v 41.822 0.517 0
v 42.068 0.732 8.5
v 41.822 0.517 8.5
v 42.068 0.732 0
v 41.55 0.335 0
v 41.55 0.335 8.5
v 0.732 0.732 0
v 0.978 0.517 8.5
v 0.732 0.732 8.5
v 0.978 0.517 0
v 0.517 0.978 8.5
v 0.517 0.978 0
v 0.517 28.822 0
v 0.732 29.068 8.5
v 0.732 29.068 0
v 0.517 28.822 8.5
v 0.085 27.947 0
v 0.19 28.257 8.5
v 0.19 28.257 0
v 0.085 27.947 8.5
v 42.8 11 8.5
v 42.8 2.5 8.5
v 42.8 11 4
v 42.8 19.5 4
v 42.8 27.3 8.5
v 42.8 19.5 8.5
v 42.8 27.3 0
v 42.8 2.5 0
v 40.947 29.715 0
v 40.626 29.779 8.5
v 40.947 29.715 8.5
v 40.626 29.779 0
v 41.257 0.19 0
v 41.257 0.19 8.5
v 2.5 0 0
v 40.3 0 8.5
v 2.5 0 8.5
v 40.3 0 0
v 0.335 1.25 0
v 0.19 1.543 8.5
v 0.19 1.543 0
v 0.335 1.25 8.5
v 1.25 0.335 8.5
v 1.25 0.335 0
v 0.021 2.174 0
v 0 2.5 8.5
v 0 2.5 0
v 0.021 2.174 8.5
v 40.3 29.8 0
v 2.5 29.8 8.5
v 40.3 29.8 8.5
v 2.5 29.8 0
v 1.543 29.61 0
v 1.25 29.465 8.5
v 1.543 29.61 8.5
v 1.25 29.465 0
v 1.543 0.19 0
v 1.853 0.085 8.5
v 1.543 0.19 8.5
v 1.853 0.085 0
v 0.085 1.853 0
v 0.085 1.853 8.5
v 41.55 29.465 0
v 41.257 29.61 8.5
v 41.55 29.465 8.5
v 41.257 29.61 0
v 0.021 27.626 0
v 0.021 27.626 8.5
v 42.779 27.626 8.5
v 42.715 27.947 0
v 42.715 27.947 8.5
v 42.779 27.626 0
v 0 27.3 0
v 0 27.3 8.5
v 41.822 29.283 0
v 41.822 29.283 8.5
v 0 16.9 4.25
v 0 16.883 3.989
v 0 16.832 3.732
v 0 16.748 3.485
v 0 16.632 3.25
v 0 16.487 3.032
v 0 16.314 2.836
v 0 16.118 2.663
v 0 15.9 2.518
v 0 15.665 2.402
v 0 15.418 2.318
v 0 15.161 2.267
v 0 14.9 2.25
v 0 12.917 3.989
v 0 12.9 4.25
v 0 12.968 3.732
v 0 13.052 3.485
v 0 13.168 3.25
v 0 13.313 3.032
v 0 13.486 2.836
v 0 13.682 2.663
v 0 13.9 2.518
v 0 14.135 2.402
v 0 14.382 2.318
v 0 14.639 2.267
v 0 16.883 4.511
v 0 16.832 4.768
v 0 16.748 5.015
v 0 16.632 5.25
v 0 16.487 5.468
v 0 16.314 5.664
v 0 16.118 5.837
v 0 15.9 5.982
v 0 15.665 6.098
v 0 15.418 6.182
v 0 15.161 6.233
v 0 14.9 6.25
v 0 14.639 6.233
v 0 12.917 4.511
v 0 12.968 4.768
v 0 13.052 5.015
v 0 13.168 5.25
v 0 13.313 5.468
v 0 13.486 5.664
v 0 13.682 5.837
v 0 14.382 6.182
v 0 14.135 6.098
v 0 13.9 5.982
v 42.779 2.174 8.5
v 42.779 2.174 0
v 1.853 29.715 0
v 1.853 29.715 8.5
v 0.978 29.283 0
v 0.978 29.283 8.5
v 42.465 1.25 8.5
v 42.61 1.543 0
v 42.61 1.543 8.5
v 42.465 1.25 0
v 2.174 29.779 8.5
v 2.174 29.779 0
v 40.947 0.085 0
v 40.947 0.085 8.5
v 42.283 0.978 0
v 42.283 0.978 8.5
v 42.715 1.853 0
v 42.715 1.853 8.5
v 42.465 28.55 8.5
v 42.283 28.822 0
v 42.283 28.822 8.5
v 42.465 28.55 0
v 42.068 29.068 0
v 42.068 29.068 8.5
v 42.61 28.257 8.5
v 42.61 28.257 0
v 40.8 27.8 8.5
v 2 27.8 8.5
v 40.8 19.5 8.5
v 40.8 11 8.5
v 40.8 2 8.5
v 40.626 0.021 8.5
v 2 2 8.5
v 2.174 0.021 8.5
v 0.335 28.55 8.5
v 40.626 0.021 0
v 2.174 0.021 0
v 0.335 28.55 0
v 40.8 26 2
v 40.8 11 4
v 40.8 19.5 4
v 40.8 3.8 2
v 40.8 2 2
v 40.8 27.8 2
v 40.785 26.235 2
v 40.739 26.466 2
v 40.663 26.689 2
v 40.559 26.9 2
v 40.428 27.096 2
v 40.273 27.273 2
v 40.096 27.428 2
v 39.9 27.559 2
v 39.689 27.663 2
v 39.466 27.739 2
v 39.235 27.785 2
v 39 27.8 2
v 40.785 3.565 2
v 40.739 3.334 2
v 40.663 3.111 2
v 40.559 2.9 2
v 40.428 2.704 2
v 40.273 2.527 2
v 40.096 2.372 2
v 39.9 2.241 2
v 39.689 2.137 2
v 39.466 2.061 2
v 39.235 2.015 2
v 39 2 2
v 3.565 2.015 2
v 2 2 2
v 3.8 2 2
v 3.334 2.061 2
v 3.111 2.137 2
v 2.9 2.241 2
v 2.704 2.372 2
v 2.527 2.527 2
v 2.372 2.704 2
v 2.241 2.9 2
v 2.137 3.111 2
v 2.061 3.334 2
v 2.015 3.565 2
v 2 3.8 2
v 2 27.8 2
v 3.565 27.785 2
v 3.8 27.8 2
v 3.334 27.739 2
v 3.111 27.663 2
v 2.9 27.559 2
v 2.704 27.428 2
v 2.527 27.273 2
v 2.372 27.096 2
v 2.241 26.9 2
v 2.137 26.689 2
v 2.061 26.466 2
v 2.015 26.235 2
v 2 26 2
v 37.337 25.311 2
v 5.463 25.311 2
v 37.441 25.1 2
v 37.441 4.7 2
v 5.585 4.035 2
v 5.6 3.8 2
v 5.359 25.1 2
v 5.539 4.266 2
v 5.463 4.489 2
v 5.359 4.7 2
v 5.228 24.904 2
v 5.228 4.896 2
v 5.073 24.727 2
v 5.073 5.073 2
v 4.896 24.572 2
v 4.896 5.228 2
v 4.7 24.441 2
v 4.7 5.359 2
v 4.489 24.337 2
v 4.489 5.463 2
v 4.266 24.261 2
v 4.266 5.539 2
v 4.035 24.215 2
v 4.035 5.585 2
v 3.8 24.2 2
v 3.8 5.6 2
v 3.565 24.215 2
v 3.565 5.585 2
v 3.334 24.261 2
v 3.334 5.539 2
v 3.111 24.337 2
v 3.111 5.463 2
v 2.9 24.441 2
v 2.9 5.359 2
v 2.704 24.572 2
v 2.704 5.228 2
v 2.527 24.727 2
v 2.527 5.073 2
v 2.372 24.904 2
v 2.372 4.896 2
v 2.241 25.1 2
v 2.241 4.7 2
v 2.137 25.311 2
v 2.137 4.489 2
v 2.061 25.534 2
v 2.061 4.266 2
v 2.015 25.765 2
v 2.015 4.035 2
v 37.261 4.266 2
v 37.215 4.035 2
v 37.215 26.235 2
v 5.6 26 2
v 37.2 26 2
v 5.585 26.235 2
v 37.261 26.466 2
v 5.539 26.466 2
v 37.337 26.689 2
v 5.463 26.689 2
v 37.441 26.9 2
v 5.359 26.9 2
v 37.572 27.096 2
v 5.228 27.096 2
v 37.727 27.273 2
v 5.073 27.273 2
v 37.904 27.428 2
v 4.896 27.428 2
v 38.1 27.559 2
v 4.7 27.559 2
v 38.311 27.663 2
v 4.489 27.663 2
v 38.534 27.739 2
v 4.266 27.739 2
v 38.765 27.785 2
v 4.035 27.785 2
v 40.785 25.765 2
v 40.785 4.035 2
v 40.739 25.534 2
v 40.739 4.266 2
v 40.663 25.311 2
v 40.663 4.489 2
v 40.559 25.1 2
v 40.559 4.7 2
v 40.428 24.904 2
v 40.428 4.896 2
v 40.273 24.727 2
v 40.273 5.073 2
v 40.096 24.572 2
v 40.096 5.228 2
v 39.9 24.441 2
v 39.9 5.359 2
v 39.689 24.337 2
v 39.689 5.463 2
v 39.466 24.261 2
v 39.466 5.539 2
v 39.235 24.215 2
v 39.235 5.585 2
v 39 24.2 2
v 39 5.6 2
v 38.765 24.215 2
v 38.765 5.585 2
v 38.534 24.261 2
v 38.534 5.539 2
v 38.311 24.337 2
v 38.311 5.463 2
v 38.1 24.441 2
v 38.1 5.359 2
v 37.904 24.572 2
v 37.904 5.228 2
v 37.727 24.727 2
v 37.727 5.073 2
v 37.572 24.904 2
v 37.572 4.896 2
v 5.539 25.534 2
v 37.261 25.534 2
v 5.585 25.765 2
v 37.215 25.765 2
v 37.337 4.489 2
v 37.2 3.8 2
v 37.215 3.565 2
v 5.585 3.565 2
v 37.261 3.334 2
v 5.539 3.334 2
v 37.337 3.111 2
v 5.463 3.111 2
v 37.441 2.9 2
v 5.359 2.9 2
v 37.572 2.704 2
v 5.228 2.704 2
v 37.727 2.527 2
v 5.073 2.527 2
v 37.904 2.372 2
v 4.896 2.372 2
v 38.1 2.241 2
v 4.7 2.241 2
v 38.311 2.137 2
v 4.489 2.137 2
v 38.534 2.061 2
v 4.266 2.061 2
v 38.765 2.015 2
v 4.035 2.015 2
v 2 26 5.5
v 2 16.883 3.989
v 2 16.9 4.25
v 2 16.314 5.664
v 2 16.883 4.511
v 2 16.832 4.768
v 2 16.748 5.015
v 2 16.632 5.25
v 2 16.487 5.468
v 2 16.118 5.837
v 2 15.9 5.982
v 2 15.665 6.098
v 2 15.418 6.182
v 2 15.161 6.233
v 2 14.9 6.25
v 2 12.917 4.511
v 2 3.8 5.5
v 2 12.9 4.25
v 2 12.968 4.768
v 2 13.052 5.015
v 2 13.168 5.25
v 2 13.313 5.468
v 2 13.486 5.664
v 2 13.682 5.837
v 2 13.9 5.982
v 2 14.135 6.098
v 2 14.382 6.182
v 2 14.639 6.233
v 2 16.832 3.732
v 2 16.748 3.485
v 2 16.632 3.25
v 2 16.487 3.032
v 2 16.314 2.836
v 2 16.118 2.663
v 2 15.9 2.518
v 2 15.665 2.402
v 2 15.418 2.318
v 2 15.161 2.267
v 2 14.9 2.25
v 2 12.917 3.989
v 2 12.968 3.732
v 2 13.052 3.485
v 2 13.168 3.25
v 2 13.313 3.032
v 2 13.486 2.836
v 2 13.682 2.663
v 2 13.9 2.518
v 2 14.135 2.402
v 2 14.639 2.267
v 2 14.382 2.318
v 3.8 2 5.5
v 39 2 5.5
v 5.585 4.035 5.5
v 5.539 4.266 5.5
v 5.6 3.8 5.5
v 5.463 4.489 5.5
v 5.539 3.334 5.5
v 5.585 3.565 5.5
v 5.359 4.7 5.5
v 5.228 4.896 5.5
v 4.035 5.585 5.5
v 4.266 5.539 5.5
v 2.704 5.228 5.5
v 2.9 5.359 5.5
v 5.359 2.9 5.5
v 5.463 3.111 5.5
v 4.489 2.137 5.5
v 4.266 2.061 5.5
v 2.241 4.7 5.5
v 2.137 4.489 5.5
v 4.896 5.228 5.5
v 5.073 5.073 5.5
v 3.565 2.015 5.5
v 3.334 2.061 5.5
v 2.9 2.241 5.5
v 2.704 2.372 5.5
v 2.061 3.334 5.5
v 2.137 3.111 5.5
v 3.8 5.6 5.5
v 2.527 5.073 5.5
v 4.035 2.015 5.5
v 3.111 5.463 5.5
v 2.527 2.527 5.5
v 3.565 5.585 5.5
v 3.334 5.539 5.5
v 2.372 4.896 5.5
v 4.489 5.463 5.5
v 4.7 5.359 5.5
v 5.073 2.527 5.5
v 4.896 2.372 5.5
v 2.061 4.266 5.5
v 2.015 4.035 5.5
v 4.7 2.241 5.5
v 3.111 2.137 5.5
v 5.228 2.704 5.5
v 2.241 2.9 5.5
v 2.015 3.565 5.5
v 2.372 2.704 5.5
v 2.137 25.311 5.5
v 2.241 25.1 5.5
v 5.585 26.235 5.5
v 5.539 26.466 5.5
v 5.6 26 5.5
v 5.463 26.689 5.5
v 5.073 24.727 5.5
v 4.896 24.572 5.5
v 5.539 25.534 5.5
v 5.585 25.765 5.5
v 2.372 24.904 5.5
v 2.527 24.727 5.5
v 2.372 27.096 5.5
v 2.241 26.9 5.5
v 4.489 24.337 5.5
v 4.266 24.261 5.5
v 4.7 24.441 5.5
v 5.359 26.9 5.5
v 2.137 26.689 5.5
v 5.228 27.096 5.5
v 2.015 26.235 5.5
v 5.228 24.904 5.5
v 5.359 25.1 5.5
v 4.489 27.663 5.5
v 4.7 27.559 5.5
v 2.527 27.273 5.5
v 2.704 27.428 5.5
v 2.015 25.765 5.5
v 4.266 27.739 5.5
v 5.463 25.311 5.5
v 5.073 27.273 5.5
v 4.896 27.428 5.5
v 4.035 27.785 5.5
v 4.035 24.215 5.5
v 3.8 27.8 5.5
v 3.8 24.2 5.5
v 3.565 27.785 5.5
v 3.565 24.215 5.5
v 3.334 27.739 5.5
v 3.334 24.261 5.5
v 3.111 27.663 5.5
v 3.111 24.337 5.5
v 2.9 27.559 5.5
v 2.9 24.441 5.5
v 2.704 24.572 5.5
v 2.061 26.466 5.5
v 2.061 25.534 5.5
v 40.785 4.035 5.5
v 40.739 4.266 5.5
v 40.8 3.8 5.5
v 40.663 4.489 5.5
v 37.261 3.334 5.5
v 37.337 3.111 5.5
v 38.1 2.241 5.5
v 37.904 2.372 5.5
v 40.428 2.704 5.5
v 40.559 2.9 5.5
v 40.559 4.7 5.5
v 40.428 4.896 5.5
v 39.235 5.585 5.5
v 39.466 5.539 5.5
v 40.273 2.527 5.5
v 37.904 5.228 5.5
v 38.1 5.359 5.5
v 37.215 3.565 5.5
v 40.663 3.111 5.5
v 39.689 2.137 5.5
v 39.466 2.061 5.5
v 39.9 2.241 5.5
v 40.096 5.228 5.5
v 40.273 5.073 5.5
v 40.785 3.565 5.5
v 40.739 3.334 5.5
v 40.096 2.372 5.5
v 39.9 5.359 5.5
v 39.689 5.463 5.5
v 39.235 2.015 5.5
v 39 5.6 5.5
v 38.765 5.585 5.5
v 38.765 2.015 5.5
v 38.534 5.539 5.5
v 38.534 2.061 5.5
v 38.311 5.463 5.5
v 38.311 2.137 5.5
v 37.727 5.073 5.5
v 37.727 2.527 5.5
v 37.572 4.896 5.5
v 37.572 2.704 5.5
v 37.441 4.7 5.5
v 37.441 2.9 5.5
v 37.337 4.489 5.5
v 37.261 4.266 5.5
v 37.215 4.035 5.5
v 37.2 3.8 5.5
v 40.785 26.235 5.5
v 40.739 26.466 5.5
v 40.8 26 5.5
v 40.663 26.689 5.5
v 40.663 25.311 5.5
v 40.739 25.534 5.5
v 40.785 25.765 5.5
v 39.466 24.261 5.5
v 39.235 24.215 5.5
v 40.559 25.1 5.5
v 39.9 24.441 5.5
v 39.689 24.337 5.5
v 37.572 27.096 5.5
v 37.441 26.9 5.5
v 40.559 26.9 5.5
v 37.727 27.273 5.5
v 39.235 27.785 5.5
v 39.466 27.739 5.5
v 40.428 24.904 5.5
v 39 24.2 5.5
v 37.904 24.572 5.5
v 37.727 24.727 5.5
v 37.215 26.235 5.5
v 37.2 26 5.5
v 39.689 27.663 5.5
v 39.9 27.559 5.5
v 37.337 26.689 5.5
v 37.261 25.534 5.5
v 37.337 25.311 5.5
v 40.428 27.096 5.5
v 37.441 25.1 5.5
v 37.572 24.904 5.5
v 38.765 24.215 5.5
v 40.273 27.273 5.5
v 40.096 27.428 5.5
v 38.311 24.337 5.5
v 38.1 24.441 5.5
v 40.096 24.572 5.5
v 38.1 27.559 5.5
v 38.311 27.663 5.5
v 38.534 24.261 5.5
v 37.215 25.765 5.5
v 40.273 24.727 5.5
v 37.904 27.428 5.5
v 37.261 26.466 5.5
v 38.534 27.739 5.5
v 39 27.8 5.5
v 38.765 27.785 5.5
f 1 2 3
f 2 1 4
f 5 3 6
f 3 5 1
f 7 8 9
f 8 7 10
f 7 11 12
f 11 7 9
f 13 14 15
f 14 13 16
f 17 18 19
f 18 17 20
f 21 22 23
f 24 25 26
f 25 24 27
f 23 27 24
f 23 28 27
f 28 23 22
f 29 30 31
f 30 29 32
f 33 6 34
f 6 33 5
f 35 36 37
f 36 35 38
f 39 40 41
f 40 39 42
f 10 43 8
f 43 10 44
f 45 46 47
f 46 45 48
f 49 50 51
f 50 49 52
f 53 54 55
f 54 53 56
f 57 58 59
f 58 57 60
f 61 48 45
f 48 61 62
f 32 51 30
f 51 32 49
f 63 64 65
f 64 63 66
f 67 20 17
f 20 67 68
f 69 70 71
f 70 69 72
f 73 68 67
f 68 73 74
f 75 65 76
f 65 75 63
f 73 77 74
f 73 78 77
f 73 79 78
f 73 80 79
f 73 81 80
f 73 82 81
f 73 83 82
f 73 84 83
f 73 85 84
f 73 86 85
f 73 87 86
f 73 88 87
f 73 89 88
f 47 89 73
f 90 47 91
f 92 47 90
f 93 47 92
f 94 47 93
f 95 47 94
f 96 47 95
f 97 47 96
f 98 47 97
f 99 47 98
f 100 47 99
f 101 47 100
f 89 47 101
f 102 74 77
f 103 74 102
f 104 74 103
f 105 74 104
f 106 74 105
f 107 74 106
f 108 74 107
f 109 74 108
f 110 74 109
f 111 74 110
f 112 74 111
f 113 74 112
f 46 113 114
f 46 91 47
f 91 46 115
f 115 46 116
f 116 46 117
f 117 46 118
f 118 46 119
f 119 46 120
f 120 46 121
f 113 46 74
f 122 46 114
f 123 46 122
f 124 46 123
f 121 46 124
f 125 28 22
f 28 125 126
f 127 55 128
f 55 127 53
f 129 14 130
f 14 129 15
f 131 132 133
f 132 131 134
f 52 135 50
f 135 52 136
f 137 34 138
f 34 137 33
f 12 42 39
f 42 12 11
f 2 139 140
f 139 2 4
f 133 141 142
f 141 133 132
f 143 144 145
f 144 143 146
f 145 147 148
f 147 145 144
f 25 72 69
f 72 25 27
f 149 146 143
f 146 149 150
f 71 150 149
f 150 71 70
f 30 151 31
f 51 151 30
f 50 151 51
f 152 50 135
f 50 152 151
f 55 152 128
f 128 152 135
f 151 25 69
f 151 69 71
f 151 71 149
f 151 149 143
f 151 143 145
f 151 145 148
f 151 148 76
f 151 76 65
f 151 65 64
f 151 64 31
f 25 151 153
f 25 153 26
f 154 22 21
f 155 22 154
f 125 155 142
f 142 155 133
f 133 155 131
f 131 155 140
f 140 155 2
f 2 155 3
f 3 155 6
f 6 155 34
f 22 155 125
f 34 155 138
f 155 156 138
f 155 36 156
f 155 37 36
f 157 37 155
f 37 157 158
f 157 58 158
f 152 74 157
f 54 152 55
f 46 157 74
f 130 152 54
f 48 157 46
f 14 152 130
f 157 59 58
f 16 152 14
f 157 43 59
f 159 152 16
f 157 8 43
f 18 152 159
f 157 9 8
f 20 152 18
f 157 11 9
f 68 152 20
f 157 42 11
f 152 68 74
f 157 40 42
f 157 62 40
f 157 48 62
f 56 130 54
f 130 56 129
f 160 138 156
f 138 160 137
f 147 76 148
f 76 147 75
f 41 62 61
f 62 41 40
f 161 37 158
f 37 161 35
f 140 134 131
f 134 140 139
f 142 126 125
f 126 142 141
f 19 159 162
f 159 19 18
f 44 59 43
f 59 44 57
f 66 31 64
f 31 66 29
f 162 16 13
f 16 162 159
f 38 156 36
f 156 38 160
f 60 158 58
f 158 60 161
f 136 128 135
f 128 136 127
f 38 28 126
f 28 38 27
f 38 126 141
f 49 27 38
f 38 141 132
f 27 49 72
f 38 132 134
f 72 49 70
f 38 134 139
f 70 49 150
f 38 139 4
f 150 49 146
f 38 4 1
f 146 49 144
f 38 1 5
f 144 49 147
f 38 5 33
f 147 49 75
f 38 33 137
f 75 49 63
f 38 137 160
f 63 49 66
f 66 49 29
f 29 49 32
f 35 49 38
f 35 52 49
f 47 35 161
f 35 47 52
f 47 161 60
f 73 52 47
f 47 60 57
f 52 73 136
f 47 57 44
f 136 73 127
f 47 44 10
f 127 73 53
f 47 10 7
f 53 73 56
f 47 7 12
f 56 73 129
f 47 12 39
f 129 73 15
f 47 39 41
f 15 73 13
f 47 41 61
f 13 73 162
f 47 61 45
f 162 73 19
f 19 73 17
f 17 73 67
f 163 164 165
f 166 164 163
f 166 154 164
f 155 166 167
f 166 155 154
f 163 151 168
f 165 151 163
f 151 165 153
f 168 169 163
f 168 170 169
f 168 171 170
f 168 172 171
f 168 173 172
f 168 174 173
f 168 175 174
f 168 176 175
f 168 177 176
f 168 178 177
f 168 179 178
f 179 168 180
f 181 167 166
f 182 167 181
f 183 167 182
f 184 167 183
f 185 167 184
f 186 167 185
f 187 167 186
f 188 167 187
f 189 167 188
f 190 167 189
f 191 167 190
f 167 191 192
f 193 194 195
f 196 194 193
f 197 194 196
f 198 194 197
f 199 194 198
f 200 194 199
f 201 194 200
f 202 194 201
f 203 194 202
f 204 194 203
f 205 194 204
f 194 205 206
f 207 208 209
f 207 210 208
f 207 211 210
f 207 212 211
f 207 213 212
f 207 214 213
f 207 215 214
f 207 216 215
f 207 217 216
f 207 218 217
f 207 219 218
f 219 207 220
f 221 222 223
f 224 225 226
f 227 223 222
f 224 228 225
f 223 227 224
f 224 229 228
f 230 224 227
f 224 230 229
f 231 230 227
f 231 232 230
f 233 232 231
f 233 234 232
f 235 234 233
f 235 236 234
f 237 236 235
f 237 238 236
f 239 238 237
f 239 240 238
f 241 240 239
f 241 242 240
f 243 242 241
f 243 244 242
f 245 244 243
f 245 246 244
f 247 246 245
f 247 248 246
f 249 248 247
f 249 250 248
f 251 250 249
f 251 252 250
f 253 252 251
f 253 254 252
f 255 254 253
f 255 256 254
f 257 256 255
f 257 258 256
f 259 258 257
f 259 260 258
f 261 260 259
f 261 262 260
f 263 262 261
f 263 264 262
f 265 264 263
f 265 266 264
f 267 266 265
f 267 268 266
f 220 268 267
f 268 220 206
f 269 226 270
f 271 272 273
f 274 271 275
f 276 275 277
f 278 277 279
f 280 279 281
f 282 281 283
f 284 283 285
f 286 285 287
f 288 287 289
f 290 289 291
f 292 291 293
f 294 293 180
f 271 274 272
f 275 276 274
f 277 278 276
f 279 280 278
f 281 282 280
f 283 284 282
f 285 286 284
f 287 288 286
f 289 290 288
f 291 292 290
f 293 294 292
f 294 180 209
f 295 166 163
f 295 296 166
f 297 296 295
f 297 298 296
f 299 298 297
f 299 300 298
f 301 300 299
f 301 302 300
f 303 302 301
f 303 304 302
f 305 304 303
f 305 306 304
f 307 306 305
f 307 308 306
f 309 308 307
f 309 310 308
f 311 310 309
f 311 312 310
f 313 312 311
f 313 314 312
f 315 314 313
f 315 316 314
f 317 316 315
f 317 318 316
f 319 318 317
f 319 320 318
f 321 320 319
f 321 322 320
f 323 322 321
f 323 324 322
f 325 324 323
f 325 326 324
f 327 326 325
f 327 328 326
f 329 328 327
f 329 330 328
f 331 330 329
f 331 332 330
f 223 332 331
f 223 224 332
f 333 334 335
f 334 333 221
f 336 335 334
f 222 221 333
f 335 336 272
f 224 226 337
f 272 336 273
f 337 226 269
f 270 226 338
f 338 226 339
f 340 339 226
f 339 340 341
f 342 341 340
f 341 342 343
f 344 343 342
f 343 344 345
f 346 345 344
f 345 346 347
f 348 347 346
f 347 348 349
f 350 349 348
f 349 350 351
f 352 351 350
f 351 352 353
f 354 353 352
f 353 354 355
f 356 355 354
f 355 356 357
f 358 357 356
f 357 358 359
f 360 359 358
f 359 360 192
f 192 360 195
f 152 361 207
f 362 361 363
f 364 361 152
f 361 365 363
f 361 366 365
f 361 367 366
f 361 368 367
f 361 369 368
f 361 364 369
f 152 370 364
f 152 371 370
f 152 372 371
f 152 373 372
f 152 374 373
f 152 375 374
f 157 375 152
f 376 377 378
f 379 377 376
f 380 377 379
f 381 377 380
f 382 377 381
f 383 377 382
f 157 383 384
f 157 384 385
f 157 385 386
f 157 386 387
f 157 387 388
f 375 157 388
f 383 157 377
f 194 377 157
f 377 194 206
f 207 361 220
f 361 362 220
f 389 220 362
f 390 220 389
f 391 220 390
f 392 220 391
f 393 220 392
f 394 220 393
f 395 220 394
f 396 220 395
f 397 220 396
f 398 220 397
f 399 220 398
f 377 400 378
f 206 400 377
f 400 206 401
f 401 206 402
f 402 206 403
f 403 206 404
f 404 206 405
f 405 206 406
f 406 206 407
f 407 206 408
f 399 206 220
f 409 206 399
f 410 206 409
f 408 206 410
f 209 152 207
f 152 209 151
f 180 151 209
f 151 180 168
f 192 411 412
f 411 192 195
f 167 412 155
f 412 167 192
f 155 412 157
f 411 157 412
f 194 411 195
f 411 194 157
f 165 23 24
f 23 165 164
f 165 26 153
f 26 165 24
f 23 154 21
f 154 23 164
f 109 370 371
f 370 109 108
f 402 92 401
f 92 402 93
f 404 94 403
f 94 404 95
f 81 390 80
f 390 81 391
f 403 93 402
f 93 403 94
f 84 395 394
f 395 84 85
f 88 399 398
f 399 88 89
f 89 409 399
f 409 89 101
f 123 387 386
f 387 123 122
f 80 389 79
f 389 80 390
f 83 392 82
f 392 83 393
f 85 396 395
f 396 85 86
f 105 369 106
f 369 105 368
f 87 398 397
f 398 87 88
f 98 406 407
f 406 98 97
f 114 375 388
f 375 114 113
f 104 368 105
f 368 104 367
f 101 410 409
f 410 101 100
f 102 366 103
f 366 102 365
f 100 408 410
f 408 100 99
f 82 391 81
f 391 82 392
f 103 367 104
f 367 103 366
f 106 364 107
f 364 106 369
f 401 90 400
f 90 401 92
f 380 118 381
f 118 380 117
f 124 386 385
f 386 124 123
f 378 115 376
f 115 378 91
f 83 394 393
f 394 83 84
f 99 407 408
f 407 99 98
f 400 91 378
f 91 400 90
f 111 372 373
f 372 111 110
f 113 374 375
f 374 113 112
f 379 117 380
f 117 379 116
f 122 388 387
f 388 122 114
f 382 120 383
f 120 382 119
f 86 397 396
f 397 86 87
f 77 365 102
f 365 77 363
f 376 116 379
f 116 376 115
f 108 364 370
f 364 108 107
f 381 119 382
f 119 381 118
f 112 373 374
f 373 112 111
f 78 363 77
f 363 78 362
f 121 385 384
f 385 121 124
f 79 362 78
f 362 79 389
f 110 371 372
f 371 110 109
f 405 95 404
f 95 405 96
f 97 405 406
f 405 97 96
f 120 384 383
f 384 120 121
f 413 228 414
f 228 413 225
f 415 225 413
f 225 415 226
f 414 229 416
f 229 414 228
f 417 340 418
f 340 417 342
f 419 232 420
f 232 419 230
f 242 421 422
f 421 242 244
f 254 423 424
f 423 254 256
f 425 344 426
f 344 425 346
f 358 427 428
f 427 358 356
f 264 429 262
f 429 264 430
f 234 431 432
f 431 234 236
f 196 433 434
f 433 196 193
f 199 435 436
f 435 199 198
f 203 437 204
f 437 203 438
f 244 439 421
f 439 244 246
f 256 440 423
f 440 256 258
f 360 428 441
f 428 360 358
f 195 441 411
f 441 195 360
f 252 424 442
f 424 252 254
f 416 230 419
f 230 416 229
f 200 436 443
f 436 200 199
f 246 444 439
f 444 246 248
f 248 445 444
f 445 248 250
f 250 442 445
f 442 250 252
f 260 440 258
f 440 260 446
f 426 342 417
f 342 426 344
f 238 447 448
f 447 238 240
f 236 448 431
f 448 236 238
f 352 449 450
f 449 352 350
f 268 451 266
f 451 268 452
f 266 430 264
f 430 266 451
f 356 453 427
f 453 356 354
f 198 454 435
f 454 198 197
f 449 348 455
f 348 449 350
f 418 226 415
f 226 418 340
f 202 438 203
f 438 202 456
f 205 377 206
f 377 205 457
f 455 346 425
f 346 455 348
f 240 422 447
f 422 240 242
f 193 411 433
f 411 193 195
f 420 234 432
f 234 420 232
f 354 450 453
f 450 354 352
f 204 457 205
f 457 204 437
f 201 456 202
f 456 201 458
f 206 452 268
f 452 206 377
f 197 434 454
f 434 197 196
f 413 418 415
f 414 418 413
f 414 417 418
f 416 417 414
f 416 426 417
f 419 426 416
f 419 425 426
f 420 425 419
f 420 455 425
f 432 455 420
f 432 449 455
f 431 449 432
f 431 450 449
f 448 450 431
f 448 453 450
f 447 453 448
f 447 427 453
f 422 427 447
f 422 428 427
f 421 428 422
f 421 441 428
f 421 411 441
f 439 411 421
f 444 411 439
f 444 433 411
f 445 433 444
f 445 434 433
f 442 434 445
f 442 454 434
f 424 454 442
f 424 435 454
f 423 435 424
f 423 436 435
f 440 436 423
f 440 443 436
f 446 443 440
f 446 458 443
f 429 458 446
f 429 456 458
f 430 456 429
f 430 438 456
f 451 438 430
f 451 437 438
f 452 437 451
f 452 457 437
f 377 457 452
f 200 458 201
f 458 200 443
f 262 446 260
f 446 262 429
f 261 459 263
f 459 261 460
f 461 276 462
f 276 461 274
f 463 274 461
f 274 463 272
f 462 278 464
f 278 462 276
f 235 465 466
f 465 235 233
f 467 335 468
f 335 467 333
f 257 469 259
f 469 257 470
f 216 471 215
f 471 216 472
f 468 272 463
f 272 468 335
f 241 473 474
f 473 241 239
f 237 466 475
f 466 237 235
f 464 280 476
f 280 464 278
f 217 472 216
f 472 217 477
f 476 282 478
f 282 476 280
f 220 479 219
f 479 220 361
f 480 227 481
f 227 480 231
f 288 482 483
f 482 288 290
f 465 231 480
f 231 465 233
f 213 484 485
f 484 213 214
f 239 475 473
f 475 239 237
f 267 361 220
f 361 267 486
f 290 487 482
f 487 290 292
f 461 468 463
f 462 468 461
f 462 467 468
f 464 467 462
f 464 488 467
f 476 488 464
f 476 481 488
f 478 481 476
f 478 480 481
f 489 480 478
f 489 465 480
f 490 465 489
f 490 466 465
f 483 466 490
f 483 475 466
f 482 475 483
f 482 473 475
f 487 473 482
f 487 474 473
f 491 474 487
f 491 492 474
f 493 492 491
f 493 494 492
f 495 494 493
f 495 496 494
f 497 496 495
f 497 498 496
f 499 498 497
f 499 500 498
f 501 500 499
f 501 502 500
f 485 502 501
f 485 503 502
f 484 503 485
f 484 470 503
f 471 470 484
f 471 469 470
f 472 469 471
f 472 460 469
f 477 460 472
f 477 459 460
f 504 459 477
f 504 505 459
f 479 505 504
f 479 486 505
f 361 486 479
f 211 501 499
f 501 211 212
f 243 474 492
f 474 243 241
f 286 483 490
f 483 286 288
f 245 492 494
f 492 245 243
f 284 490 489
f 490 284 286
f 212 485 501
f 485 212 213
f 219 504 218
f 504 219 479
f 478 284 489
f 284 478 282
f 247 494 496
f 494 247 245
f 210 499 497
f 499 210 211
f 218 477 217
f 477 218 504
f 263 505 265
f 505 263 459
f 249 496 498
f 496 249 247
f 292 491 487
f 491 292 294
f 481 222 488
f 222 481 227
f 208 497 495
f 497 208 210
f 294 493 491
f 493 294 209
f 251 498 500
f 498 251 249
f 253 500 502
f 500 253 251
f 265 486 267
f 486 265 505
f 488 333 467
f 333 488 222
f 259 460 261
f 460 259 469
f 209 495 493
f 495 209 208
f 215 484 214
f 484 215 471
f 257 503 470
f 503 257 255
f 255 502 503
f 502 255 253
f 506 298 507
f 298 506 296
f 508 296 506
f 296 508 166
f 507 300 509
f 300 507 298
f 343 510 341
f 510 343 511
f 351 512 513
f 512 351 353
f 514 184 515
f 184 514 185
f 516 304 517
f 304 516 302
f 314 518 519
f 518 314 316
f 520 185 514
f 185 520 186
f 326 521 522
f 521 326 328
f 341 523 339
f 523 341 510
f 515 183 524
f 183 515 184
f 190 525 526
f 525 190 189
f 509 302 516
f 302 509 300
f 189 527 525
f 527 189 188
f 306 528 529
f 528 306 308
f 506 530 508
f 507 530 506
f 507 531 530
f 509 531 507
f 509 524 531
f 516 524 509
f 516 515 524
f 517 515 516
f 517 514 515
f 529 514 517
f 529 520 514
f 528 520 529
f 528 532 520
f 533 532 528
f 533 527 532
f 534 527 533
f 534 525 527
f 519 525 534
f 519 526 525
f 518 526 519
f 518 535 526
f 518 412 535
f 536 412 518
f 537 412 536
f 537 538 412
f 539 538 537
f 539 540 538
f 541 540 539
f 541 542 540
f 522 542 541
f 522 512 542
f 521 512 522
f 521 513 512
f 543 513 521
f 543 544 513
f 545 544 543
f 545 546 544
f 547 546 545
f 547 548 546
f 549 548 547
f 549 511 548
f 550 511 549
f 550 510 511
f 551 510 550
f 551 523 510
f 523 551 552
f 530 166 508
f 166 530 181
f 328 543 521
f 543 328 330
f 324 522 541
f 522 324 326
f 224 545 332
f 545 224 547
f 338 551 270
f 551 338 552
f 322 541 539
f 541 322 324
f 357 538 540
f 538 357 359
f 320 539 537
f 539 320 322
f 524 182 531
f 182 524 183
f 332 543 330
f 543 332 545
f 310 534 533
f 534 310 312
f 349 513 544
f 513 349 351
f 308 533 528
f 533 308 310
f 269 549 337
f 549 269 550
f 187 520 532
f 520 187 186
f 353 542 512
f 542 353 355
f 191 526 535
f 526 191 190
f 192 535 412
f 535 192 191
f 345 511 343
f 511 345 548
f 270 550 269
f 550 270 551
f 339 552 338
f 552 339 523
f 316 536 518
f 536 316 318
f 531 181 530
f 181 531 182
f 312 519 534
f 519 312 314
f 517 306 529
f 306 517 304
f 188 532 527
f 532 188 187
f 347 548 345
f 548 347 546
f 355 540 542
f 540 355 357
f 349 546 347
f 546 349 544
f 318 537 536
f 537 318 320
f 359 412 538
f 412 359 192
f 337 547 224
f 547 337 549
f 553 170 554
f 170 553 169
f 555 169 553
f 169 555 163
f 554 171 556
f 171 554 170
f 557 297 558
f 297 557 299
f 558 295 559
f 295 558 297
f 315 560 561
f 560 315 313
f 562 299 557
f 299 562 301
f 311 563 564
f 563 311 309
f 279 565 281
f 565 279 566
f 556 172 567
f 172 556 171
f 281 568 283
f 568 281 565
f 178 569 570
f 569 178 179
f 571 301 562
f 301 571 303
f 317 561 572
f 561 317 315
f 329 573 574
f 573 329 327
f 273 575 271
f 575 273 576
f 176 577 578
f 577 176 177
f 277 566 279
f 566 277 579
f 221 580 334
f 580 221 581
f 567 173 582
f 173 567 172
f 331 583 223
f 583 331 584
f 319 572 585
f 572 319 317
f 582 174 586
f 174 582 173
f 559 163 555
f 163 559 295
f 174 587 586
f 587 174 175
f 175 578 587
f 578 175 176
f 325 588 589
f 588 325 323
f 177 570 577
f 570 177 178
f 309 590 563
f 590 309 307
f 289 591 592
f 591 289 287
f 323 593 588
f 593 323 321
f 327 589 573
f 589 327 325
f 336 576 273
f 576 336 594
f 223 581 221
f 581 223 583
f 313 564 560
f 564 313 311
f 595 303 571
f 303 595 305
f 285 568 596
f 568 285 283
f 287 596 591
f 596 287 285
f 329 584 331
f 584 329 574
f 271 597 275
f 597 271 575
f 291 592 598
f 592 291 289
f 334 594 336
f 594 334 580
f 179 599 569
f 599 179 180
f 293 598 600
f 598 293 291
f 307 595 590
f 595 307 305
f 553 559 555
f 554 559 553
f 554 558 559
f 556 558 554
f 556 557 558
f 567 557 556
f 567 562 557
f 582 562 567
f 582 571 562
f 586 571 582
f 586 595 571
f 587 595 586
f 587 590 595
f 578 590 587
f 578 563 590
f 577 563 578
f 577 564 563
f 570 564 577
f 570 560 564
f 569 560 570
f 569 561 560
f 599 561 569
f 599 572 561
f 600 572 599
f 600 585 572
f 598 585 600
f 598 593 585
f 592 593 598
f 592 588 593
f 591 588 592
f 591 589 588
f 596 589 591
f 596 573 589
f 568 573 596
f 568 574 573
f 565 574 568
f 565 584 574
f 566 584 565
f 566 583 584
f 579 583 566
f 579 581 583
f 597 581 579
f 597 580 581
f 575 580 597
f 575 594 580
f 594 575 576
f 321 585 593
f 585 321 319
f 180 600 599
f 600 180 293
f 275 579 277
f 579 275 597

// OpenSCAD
// TinyPulse-412 Snap-Fit Pocket Enclosure
// Board dimensions: 38.0 mm x 25.0 mm x 1.6 mm
// Clearance: 0.4 mm per side, 2.0 mm wall thickness

$fn = 48;

pcb_w = 38.0;
pcb_d = 25.0;
pcb_t = 1.6;
tol = 0.4;
wall = 2.0;
base_h = 8.5;

module rounded_box(w, d, h, r) {
    hull() {
        translate([r, r, 0]) cylinder(r=r, h=h);
        translate([w-r, r, 0]) cylinder(r=r, h=h);
        translate([w-r, d-r, 0]) cylinder(r=r, h=h);
        translate([r, d-r, 0]) cylinder(r=r, h=h);
    }
}

module tinypulse_enclosure() {
    outer_w = pcb_w + 2*tol + 2*wall;
    outer_d = pcb_d + 2*tol + 2*wall;

    difference() {
        rounded_box(outer_w, outer_d, base_h, 2.5);

        // Main PCB + CR2032 bottom cavity
        translate([wall, wall, wall])
            cube([pcb_w + 2*tol, pcb_d + 2*tol, base_h]);

        // UPDI 3-pin programming header side access slot
        translate([outer_w - wall - 0.5, wall + 9.0, wall + 2.0])
            cube([wall + 1.0, 8.5, base_h]);

        // Keychain lanyard loop cutout
        translate([-0.5, outer_d/2, base_h/2])
            rotate([0, 90, 0])
            cylinder(r=2.0, h=wall+1.0);
    }

    // 4 Corner PCB Standoff Pillars (3.5mm height for CR2032 holder clearance)
    for (dx = [wall + 1.8, outer_w - wall - 1.8]) {
        for (dy = [wall + 1.8, outer_d - wall - 1.8]) {
            translate([dx, dy, wall])
                cylinder(r=1.8, h=3.5);
        }
    }
}

tinypulse_enclosure();
